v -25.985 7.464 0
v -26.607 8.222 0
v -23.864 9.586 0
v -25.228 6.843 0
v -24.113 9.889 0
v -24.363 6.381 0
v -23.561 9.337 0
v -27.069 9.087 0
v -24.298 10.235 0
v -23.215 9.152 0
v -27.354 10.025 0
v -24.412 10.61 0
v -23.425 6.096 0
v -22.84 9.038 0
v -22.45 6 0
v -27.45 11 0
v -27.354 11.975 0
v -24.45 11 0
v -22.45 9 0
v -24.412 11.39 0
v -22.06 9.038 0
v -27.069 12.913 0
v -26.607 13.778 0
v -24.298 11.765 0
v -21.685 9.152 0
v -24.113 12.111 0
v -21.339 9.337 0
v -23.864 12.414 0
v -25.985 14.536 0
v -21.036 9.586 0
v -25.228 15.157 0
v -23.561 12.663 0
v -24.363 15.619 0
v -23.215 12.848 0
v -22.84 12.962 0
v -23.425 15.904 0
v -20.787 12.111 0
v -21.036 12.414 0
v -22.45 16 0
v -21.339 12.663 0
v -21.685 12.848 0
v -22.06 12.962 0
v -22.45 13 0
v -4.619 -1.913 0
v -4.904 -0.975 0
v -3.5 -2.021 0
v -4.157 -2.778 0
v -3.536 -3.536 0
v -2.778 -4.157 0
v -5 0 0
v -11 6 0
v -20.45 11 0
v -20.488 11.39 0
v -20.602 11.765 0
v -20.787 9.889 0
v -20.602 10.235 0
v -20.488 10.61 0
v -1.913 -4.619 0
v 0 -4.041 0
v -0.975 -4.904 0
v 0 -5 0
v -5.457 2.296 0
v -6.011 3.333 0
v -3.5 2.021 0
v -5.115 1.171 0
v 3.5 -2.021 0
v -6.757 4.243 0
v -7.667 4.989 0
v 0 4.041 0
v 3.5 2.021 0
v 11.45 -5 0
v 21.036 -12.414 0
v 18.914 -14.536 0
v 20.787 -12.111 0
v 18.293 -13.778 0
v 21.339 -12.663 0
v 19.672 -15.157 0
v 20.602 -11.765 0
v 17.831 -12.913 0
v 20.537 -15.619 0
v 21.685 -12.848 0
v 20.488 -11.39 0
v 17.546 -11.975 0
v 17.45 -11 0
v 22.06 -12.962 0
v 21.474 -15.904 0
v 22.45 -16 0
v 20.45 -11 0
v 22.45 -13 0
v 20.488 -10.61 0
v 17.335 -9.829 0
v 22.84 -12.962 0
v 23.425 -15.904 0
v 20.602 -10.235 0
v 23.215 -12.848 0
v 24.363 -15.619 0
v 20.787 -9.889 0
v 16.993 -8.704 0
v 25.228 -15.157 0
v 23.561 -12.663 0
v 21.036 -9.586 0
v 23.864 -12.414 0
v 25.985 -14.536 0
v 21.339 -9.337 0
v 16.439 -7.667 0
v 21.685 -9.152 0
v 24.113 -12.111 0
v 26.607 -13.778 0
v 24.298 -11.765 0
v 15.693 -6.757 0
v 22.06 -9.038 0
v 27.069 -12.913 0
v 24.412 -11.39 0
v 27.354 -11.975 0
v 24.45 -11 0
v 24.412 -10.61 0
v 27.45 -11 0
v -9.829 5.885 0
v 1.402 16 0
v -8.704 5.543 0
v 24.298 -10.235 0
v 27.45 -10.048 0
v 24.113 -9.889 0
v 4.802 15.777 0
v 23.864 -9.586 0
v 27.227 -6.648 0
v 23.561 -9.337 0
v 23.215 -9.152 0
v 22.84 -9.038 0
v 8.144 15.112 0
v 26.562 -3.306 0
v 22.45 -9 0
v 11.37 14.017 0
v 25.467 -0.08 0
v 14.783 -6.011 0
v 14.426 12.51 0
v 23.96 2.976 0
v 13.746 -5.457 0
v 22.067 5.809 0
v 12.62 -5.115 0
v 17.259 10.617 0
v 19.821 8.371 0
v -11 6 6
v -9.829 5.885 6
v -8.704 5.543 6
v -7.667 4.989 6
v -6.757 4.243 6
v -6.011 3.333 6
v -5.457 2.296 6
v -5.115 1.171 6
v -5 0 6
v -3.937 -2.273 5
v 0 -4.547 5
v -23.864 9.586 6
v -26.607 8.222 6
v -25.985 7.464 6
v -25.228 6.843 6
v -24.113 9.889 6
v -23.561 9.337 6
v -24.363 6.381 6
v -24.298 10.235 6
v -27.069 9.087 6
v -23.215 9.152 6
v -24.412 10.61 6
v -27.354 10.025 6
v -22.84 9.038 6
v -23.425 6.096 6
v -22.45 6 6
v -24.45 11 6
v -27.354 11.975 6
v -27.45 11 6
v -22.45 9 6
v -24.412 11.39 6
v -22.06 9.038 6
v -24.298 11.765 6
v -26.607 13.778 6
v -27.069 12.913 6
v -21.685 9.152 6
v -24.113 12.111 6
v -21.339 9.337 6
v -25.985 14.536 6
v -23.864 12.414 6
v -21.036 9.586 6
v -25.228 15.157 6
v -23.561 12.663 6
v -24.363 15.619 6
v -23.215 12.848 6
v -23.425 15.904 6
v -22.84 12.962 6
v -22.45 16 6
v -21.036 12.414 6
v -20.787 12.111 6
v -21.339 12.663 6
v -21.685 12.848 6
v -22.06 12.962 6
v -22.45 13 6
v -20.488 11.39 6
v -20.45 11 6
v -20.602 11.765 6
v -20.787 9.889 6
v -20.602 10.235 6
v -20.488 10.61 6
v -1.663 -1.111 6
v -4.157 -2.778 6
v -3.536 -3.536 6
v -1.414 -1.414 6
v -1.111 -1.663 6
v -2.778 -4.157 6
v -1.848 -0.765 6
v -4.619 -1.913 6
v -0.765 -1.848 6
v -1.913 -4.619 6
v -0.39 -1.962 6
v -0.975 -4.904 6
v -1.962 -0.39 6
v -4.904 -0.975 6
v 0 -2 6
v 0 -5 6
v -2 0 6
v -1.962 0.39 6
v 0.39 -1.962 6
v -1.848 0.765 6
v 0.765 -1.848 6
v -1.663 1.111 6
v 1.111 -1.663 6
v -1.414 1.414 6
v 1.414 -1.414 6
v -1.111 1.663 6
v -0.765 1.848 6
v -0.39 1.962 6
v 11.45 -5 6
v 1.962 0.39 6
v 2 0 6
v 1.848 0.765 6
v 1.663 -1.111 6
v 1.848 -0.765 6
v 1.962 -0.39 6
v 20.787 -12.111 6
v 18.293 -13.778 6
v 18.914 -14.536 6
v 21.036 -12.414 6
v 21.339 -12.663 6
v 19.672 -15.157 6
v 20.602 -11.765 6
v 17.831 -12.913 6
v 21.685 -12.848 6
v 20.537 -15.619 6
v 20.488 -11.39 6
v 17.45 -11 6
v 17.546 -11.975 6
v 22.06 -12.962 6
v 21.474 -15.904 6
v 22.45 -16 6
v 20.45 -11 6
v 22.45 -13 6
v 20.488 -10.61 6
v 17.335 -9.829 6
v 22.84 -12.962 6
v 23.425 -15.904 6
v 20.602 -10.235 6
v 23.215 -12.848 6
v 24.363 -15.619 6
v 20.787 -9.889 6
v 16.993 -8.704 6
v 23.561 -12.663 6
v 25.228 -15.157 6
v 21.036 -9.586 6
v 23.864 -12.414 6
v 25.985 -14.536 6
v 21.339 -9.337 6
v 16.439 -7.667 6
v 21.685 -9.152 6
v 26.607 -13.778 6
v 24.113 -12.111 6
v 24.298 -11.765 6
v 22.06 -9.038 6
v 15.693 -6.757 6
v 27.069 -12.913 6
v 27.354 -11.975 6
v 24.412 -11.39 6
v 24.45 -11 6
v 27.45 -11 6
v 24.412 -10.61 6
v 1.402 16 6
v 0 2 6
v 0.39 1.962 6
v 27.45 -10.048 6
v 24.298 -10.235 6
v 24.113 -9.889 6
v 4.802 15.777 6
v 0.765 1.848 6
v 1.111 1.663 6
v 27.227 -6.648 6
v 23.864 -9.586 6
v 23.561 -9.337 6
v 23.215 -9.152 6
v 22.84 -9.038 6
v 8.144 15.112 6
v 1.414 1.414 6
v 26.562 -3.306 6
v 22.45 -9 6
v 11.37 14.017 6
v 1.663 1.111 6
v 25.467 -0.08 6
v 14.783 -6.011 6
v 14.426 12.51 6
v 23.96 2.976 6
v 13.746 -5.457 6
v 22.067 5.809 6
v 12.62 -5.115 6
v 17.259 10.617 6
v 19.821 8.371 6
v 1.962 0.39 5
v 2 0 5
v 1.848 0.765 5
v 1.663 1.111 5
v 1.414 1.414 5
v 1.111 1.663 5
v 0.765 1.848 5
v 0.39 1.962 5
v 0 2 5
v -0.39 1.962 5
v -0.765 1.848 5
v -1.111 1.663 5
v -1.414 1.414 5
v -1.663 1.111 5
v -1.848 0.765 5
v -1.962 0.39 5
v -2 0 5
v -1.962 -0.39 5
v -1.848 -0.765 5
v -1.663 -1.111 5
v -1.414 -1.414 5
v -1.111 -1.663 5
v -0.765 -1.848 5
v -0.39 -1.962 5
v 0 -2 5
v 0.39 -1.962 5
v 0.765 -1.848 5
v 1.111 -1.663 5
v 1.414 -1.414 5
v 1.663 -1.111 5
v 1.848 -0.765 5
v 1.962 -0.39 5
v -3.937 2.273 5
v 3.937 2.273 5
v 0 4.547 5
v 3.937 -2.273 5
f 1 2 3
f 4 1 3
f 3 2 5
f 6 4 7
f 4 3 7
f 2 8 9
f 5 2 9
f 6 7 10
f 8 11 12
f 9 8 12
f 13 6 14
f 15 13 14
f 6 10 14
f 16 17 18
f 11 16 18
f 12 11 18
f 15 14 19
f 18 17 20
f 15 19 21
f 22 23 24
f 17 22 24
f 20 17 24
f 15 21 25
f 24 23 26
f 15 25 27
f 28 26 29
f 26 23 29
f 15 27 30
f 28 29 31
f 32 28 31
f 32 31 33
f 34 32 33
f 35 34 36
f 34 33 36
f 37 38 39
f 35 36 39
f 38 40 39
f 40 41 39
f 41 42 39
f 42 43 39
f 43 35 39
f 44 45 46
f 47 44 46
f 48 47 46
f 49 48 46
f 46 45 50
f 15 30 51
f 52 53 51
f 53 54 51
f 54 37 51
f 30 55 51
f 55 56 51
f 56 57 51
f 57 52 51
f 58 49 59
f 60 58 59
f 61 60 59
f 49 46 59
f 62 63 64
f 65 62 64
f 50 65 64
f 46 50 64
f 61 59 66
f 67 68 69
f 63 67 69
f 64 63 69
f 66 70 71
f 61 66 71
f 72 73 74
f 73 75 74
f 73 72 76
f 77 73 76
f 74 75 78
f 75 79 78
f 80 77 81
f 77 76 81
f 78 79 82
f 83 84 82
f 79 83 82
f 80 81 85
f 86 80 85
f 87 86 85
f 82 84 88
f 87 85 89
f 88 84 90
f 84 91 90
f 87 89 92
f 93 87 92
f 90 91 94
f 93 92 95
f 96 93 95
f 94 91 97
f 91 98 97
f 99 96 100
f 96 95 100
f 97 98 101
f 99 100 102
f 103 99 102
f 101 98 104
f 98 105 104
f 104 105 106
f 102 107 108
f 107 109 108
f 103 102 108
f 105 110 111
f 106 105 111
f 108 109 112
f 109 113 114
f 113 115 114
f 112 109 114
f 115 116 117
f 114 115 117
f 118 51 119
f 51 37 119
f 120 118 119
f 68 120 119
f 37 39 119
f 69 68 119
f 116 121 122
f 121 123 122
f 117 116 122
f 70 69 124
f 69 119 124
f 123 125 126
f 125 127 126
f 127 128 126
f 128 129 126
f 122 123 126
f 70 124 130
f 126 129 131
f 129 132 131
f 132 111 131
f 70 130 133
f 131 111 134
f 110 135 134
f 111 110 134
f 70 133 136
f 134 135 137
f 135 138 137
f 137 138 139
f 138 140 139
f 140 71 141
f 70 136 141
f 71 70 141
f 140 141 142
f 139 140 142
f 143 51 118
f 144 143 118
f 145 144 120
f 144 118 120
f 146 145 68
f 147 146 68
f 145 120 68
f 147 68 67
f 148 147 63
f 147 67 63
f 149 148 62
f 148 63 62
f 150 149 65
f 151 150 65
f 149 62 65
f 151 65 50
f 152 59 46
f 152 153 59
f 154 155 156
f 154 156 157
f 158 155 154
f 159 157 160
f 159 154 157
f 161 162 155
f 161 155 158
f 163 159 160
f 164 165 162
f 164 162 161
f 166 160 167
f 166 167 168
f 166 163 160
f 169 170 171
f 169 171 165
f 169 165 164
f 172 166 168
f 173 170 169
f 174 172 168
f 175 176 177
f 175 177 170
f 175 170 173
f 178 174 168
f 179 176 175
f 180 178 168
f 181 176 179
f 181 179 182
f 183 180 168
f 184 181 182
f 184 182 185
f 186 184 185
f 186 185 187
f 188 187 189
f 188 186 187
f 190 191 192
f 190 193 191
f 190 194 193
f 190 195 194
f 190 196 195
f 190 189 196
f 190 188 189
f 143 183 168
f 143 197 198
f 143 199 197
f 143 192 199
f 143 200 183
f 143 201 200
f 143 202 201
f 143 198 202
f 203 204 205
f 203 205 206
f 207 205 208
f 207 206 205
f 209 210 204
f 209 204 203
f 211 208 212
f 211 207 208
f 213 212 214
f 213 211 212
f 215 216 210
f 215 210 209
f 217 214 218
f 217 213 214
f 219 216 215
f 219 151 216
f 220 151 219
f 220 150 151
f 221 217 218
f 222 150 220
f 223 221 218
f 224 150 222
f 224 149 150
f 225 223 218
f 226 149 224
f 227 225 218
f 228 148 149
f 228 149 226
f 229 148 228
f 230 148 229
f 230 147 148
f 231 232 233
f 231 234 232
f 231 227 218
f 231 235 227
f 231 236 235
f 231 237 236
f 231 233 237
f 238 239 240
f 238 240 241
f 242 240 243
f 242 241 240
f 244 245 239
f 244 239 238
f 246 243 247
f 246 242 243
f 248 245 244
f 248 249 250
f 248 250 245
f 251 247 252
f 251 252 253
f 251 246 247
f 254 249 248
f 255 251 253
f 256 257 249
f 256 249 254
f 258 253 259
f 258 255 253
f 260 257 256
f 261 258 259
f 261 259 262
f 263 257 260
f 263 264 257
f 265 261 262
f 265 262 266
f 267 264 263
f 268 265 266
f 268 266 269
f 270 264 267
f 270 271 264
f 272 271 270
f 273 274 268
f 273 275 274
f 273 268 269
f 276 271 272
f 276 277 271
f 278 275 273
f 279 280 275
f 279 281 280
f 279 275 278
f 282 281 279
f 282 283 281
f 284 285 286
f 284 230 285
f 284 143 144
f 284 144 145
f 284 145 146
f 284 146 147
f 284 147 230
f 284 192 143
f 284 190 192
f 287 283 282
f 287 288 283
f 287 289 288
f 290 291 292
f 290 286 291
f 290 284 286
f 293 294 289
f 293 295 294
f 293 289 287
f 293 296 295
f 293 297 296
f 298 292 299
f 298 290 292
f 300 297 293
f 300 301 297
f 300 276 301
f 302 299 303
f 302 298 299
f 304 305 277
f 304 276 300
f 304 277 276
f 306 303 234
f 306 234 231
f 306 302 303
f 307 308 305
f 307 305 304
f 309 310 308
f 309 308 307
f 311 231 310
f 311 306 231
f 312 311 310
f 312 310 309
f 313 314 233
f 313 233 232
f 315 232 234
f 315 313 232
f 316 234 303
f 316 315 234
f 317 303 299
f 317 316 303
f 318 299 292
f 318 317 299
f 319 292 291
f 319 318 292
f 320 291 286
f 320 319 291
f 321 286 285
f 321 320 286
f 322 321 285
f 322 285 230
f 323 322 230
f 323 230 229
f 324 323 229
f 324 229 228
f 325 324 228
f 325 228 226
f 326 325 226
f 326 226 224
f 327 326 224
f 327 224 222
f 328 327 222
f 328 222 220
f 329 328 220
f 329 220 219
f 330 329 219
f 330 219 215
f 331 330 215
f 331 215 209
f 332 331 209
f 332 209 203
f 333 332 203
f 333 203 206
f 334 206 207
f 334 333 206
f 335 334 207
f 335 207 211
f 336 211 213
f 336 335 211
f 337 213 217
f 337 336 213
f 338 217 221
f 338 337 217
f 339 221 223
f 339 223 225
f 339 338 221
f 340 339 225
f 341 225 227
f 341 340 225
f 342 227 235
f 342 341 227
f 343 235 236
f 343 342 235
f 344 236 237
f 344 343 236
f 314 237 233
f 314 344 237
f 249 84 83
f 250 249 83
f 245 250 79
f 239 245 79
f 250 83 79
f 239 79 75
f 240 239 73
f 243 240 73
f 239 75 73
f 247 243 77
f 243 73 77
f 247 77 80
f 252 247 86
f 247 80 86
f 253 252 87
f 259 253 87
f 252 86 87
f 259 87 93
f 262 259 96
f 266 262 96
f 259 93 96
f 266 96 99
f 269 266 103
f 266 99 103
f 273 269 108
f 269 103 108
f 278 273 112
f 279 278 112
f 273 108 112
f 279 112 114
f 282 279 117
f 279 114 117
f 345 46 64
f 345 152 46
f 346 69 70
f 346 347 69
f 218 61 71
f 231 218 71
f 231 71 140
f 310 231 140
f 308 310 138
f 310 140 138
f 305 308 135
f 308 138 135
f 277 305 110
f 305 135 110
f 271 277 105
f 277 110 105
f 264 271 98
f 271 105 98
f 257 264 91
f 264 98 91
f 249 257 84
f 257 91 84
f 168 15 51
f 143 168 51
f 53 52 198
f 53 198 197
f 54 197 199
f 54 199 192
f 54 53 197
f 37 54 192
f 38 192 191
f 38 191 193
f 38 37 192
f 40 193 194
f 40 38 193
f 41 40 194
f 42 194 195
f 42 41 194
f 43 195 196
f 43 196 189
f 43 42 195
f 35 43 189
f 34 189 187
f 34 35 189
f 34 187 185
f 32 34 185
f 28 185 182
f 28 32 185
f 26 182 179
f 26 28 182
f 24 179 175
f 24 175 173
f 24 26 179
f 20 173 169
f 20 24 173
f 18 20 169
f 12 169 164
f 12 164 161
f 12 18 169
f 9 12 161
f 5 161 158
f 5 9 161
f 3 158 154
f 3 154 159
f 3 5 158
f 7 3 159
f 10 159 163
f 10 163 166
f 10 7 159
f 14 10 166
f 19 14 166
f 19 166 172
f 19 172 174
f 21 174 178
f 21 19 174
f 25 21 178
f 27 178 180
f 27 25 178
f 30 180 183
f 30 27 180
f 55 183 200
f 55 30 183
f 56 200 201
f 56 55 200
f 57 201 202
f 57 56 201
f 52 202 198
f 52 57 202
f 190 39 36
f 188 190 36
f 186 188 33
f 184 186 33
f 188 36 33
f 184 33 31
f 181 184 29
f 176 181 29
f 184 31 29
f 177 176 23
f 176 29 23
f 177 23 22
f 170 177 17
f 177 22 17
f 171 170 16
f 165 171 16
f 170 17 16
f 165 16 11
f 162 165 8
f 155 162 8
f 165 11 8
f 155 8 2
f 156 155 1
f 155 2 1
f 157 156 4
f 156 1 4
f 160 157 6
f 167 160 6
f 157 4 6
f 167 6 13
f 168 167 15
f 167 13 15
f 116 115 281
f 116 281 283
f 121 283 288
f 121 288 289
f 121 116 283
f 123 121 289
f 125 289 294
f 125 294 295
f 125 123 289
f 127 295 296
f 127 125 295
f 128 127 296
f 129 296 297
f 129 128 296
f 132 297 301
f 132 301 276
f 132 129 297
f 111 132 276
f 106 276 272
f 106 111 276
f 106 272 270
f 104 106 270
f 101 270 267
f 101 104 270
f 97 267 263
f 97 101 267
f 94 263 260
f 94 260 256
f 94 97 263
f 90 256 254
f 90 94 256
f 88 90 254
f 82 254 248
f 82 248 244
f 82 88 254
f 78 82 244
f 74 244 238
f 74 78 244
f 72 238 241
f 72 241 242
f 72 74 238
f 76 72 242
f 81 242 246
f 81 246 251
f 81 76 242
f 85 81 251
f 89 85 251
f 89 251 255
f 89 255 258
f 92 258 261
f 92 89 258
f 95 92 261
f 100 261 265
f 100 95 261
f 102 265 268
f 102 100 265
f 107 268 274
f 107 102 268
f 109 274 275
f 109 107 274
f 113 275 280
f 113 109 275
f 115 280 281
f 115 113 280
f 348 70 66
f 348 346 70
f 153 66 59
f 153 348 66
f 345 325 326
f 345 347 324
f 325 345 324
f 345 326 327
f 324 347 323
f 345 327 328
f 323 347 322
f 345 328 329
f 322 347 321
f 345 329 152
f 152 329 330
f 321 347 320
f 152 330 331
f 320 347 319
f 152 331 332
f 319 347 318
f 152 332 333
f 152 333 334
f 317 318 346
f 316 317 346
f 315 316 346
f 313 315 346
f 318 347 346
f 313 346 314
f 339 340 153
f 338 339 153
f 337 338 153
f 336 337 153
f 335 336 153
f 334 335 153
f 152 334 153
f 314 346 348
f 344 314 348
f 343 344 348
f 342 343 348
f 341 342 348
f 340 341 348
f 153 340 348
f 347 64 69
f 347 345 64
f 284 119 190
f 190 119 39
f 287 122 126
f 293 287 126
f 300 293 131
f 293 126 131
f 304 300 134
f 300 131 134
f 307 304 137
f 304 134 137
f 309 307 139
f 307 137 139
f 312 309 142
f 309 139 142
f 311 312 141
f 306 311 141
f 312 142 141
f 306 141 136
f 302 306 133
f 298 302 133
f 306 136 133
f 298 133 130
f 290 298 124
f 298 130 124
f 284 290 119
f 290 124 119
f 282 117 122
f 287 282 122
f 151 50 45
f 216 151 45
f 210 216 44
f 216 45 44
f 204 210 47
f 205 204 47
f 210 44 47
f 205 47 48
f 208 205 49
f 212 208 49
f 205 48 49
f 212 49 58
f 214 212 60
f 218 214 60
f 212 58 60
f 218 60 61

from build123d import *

# Parameters (mm, degrees)
F0_R     = 2
F1_DEPTH = 6
F3_DEPTH = 5
F3_TAPER = -5


with BuildPart() as f1:
    # F0 (on Top) → F1 (new body)
    with BuildSketch(Plane.XY):
        with BuildLine():
            ThreePointArc((-22.4499443206, 16), (-27.4499443206, 11), (-22.4499443206, 6))
            Line((-22.4499443206, 6), (-11, 6))
            ThreePointArc((-11, 6), (-6.7573593129, 4.2426406871), (-5, 0))
            ThreePointArc((-5, 0), (-3.5355339059, -3.5355339059), (0, -5))
            Line((0, -5), (11.4499443206, -5))
            ThreePointArc((11.4499443206, -5), (15.6925850078, -6.7573593129), (17.4499443206, -11))
            ThreePointArc((17.4499443206, -11), (22.4499443206, -16), (27.4499443206, -11))
            Line((27.4499443206, -11), (27.4499443206, -10.047595575))
            ThreePointArc((27.4499443206, -10.047595575), (19.8207802103, 8.3708358897), (1.4023487456, 16))
            Line((1.4023487456, 16), (-22.4499443206, 16))
        make_face()
        with Locations((22.4499443206, -11)):
            Circle(F0_R, mode=Mode.SUBTRACT)
        with Locations((-22.4499443206, 11)):
            Circle(F0_R, mode=Mode.SUBTRACT)
        Circle(F0_R, mode=Mode.SUBTRACT)
    extrude(amount=F1_DEPTH)

    # F2 (on face) → F3 (cut)
    with BuildSketch(Plane(origin=(0, 0, 0), x_dir=(1, 0, 0), z_dir=(0, 0, -1))):
        Polygon((0, -4.0414518843), (3.5, -2.0207259422), (3.5, 2.0207259422), (0, 4.0414518843), (-3.5, 2.0207259422), (-3.5, -2.0207259422), align=None)
    extrude(amount=-F3_DEPTH, taper=F3_TAPER, mode=Mode.SUBTRACT)


solid = f1.part
